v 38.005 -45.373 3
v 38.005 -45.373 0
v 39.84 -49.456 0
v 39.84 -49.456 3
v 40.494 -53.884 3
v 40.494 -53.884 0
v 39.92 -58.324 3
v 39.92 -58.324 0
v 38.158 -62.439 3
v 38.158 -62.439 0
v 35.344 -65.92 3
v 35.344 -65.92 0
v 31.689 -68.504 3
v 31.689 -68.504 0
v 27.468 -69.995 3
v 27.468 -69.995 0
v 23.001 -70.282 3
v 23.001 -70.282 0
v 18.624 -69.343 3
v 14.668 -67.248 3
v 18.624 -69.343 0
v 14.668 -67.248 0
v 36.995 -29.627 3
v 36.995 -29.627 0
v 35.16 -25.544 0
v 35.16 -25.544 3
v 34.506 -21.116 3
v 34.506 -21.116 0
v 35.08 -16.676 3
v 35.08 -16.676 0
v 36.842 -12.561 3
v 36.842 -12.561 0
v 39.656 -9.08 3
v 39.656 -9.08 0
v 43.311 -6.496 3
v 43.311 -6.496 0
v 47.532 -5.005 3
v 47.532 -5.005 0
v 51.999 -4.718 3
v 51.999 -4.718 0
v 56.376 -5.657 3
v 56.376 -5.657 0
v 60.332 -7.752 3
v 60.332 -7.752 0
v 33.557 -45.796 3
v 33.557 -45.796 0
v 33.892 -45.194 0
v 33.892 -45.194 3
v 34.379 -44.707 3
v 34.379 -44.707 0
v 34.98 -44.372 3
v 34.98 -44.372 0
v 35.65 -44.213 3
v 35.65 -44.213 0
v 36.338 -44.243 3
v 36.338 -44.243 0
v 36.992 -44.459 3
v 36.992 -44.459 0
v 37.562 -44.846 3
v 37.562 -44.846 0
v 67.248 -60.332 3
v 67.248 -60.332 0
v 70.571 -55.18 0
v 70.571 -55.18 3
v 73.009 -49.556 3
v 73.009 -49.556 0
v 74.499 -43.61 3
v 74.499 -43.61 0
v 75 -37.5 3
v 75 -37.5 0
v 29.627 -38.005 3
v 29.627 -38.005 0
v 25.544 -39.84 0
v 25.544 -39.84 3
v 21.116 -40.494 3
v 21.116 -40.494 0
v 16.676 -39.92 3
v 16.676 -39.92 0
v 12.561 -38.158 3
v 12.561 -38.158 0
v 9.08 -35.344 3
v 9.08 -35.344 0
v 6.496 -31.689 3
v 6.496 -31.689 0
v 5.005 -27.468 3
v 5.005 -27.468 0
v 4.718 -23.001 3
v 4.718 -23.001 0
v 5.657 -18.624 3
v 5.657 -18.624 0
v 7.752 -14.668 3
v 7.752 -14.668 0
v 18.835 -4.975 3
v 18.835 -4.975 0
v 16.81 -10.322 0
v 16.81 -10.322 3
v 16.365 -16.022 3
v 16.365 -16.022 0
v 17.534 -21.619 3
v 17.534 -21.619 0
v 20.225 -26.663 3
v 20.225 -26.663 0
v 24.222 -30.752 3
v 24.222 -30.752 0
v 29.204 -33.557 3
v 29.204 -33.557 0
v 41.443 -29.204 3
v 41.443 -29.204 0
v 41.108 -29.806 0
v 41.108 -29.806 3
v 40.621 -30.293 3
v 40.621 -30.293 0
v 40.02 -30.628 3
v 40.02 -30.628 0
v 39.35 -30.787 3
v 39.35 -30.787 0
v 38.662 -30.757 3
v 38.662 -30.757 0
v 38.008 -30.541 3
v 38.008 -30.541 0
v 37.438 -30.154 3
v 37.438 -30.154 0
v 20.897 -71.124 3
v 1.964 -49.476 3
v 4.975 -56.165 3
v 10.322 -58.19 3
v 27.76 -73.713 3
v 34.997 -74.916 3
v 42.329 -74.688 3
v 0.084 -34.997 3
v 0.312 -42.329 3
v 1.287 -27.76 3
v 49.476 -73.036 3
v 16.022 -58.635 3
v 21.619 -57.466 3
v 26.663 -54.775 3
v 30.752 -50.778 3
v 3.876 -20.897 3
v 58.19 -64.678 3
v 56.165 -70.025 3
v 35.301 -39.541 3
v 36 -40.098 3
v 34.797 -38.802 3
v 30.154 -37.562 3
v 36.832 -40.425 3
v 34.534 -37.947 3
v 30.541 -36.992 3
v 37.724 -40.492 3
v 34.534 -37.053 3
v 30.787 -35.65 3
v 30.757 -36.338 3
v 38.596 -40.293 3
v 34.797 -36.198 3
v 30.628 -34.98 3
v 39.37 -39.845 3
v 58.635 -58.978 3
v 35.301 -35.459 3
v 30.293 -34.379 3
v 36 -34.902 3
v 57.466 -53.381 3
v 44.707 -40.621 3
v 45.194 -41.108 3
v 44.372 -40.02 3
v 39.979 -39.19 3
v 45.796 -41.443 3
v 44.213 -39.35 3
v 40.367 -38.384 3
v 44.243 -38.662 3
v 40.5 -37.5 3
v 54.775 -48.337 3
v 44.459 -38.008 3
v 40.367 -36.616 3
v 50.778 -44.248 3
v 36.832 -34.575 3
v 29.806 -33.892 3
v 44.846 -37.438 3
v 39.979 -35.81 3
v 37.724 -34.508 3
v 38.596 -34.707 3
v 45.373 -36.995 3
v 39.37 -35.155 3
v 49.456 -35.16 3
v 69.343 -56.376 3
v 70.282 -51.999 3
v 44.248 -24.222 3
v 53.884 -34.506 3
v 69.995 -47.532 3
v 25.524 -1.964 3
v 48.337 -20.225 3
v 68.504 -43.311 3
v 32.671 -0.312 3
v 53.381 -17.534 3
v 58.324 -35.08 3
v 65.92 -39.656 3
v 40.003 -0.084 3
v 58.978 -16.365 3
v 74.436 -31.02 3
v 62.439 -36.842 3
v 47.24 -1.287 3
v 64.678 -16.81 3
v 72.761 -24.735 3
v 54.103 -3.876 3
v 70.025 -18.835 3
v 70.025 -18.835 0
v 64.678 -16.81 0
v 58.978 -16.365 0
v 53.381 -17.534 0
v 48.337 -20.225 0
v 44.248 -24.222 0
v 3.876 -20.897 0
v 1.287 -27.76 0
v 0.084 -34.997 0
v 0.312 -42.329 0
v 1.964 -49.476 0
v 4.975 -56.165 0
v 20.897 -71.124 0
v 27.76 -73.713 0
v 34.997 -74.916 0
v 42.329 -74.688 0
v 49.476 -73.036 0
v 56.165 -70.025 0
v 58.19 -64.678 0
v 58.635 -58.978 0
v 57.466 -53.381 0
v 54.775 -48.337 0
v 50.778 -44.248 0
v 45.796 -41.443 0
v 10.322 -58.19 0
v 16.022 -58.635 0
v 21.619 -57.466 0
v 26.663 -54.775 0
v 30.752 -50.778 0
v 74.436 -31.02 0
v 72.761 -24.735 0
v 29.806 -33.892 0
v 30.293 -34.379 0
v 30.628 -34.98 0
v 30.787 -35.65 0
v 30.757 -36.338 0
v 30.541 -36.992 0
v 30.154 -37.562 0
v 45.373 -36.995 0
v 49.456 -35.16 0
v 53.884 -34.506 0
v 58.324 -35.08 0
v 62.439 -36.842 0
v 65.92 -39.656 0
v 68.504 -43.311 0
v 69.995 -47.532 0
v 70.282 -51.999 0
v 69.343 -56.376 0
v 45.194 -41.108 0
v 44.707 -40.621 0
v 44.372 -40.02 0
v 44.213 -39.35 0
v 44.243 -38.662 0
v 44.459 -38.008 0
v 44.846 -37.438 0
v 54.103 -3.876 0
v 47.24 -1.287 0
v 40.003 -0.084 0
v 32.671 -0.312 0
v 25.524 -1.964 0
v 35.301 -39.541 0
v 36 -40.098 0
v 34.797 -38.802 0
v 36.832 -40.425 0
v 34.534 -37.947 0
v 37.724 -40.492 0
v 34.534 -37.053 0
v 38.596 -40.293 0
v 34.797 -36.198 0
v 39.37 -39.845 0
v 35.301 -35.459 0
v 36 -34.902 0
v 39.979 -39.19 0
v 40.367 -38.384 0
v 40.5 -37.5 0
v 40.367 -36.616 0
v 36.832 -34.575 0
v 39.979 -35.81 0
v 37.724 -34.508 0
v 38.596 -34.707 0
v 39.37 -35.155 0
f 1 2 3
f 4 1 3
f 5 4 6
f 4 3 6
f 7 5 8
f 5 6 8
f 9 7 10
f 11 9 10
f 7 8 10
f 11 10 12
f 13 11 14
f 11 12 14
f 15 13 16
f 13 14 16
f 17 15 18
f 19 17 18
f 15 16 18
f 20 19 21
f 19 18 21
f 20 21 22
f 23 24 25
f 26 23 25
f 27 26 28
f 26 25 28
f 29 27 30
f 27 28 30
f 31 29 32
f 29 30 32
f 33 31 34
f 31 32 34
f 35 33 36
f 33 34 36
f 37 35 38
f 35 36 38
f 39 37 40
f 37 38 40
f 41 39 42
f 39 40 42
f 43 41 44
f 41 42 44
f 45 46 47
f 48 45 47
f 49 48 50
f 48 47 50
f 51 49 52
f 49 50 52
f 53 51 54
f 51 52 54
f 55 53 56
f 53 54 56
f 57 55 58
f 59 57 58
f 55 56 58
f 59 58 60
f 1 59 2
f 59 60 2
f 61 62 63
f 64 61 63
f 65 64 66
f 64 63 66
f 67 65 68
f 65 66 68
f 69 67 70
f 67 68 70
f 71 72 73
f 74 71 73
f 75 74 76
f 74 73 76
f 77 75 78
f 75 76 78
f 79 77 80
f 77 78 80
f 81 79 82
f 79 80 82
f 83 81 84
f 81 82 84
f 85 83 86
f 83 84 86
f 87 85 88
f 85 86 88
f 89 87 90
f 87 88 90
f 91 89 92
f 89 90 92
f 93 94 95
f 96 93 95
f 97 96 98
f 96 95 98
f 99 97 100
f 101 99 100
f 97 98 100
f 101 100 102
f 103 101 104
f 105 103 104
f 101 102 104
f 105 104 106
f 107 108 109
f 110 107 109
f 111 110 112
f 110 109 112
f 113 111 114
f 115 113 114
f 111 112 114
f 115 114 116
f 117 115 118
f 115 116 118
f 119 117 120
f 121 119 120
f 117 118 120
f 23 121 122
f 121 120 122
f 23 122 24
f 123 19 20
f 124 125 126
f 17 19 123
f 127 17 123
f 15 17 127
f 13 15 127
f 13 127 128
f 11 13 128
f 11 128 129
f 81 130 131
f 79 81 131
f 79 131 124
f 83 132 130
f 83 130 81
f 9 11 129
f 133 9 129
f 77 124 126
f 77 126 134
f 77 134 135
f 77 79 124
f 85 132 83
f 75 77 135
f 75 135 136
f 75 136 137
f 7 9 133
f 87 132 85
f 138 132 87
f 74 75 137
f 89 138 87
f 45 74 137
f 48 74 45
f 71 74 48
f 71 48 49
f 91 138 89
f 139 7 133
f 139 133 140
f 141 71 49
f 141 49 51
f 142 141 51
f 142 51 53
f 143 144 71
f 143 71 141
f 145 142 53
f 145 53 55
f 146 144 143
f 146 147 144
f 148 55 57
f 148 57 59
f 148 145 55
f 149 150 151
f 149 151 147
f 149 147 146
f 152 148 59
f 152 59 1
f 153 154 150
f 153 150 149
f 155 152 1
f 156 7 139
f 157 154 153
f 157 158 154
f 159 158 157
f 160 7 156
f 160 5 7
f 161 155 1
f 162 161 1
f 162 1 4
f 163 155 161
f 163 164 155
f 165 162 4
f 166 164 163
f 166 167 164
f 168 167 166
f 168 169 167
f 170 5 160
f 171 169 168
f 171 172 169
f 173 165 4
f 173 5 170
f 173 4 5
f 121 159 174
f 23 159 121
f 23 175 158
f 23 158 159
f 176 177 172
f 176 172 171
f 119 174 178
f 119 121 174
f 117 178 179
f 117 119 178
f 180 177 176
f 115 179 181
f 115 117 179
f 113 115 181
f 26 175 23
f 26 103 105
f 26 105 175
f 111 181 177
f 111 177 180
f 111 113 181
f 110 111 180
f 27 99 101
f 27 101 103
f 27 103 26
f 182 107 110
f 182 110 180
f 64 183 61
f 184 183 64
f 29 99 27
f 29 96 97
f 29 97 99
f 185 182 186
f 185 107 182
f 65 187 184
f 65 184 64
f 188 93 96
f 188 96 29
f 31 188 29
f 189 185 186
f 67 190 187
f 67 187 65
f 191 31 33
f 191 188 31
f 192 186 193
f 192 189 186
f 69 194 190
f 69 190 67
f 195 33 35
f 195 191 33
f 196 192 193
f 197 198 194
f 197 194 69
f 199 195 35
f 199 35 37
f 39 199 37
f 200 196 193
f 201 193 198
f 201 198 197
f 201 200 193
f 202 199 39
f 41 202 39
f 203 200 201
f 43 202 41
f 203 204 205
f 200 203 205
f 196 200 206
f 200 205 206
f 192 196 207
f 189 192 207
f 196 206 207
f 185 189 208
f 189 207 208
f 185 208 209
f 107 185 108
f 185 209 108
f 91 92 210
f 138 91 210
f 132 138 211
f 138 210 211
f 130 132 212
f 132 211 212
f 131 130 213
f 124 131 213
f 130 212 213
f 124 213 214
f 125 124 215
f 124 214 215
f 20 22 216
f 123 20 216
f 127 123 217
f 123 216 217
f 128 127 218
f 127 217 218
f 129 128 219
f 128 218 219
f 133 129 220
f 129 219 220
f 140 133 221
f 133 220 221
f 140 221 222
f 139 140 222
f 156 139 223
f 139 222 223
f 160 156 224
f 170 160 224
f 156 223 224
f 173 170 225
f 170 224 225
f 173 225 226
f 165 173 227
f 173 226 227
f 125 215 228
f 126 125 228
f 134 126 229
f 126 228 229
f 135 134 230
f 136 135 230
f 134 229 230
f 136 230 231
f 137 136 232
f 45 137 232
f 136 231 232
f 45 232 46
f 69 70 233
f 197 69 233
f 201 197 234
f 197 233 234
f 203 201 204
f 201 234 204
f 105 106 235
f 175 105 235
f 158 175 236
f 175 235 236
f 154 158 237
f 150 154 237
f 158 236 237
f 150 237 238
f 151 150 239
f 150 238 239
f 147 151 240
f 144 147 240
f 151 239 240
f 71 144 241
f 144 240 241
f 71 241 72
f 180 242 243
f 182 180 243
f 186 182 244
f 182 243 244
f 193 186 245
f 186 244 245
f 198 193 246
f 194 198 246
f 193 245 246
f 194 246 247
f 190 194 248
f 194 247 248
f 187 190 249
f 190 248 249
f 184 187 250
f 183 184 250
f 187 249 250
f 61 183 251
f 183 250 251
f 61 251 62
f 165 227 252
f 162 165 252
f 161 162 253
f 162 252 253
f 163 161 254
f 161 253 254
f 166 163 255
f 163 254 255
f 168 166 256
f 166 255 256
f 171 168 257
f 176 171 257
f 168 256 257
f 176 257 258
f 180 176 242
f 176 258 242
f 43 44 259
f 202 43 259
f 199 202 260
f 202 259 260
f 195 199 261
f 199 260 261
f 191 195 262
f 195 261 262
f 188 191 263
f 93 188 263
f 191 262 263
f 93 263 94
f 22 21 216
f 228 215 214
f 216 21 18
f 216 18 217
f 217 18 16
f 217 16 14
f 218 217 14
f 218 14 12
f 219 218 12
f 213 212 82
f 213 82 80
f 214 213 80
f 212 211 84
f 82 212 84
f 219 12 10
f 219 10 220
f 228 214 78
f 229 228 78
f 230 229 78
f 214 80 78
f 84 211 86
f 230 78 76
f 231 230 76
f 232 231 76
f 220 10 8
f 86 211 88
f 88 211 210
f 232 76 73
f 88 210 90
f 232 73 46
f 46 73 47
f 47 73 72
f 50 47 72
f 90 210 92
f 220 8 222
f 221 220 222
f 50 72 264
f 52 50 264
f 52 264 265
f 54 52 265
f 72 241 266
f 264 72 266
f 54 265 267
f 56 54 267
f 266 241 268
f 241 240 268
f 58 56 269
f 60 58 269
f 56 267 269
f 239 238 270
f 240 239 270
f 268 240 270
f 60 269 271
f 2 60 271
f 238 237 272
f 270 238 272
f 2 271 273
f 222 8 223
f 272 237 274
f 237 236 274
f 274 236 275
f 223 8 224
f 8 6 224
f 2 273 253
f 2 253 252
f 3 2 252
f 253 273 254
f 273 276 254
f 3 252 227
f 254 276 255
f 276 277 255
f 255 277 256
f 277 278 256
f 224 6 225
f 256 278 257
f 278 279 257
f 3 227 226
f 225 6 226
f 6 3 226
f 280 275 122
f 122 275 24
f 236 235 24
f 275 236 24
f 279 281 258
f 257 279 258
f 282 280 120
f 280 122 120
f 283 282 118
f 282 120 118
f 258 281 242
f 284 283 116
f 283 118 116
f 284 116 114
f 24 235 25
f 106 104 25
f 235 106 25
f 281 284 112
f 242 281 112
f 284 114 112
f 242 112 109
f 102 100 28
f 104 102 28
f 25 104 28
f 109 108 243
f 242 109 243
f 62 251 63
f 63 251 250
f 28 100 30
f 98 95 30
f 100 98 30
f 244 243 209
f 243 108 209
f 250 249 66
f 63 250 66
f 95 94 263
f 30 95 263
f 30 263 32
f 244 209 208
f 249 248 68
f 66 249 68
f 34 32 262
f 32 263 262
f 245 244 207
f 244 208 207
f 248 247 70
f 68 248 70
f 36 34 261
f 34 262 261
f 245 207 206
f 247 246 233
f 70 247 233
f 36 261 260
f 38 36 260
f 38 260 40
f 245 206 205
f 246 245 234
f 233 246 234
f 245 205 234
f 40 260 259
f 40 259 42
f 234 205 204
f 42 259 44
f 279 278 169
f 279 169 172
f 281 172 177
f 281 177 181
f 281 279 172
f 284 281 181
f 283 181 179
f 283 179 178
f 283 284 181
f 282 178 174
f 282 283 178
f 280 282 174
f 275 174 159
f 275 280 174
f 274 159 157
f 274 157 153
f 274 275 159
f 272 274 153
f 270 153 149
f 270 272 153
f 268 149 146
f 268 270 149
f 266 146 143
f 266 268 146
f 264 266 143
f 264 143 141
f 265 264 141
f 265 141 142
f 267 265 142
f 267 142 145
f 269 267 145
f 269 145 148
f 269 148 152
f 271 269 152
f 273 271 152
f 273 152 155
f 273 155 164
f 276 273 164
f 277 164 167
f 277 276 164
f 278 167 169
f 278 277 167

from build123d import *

# Parameters (mm, degrees)
F0_R     = 3
F1_DEPTH = 3


with BuildPart() as f1:
    # F0 (on Top) → F1 (new body)
    with BuildSketch(Plane.XY):
        with BuildLine():
            ThreePointArc((67.24837, -60.331655), (73.009251, -49.555831), (75, -37.5))
            ThreePointArc((75, -37.5), (73.734834, -27.841491), (70.024705, -18.834696))
            ThreePointArc((70.024705, -18.834696), (53.381141, -17.534216), (41.443412, -29.204267))
            ThreePointArc((41.443412, -29.204267), (39.349684, -30.787351), (36.995309, -29.626849))
            ThreePointArc((36.995309, -29.626849), (39.655951, -9.080062), (60.331655, -7.75163))
            ThreePointArc((60.331655, -7.75163), (40.003324, -0.083648), (18.834696, -4.975295))
            ThreePointArc((18.834696, -4.975295), (17.534216, -21.618859), (29.204267, -33.556588))
            ThreePointArc((29.204267, -33.556588), (30.787351, -35.650316), (29.626849, -38.004691))
            ThreePointArc((29.626849, -38.004691), (9.080062, -35.344049), (7.75163, -14.668345))
            ThreePointArc((7.75163, -14.668345), (0.083648, -34.996676), (4.975295, -56.165304))
            ThreePointArc((4.975295, -56.165304), (21.618859, -57.465784), (33.556588, -45.795733))
            ThreePointArc((33.556588, -45.795733), (35.650316, -44.212649), (38.004691, -45.373151))
            ThreePointArc((38.004691, -45.373151), (35.344049, -65.919938), (14.668345, -67.24837))
            ThreePointArc((14.668345, -67.24837), (34.996676, -74.916352), (56.165304, -70.024705))
            ThreePointArc((56.165304, -70.024705), (57.465784, -53.381141), (45.795733, -41.443412))
            ThreePointArc((45.795733, -41.443412), (44.212649, -39.349684), (45.373151, -36.995309))
            ThreePointArc((45.373151, -36.995309), (65.919938, -39.655951), (67.24837, -60.331655))
        make_face()
        with Locations((37.5, -37.5)):
            Circle(F0_R, mode=Mode.SUBTRACT)
    extrude(amount=F1_DEPTH)


solid = f1.part
